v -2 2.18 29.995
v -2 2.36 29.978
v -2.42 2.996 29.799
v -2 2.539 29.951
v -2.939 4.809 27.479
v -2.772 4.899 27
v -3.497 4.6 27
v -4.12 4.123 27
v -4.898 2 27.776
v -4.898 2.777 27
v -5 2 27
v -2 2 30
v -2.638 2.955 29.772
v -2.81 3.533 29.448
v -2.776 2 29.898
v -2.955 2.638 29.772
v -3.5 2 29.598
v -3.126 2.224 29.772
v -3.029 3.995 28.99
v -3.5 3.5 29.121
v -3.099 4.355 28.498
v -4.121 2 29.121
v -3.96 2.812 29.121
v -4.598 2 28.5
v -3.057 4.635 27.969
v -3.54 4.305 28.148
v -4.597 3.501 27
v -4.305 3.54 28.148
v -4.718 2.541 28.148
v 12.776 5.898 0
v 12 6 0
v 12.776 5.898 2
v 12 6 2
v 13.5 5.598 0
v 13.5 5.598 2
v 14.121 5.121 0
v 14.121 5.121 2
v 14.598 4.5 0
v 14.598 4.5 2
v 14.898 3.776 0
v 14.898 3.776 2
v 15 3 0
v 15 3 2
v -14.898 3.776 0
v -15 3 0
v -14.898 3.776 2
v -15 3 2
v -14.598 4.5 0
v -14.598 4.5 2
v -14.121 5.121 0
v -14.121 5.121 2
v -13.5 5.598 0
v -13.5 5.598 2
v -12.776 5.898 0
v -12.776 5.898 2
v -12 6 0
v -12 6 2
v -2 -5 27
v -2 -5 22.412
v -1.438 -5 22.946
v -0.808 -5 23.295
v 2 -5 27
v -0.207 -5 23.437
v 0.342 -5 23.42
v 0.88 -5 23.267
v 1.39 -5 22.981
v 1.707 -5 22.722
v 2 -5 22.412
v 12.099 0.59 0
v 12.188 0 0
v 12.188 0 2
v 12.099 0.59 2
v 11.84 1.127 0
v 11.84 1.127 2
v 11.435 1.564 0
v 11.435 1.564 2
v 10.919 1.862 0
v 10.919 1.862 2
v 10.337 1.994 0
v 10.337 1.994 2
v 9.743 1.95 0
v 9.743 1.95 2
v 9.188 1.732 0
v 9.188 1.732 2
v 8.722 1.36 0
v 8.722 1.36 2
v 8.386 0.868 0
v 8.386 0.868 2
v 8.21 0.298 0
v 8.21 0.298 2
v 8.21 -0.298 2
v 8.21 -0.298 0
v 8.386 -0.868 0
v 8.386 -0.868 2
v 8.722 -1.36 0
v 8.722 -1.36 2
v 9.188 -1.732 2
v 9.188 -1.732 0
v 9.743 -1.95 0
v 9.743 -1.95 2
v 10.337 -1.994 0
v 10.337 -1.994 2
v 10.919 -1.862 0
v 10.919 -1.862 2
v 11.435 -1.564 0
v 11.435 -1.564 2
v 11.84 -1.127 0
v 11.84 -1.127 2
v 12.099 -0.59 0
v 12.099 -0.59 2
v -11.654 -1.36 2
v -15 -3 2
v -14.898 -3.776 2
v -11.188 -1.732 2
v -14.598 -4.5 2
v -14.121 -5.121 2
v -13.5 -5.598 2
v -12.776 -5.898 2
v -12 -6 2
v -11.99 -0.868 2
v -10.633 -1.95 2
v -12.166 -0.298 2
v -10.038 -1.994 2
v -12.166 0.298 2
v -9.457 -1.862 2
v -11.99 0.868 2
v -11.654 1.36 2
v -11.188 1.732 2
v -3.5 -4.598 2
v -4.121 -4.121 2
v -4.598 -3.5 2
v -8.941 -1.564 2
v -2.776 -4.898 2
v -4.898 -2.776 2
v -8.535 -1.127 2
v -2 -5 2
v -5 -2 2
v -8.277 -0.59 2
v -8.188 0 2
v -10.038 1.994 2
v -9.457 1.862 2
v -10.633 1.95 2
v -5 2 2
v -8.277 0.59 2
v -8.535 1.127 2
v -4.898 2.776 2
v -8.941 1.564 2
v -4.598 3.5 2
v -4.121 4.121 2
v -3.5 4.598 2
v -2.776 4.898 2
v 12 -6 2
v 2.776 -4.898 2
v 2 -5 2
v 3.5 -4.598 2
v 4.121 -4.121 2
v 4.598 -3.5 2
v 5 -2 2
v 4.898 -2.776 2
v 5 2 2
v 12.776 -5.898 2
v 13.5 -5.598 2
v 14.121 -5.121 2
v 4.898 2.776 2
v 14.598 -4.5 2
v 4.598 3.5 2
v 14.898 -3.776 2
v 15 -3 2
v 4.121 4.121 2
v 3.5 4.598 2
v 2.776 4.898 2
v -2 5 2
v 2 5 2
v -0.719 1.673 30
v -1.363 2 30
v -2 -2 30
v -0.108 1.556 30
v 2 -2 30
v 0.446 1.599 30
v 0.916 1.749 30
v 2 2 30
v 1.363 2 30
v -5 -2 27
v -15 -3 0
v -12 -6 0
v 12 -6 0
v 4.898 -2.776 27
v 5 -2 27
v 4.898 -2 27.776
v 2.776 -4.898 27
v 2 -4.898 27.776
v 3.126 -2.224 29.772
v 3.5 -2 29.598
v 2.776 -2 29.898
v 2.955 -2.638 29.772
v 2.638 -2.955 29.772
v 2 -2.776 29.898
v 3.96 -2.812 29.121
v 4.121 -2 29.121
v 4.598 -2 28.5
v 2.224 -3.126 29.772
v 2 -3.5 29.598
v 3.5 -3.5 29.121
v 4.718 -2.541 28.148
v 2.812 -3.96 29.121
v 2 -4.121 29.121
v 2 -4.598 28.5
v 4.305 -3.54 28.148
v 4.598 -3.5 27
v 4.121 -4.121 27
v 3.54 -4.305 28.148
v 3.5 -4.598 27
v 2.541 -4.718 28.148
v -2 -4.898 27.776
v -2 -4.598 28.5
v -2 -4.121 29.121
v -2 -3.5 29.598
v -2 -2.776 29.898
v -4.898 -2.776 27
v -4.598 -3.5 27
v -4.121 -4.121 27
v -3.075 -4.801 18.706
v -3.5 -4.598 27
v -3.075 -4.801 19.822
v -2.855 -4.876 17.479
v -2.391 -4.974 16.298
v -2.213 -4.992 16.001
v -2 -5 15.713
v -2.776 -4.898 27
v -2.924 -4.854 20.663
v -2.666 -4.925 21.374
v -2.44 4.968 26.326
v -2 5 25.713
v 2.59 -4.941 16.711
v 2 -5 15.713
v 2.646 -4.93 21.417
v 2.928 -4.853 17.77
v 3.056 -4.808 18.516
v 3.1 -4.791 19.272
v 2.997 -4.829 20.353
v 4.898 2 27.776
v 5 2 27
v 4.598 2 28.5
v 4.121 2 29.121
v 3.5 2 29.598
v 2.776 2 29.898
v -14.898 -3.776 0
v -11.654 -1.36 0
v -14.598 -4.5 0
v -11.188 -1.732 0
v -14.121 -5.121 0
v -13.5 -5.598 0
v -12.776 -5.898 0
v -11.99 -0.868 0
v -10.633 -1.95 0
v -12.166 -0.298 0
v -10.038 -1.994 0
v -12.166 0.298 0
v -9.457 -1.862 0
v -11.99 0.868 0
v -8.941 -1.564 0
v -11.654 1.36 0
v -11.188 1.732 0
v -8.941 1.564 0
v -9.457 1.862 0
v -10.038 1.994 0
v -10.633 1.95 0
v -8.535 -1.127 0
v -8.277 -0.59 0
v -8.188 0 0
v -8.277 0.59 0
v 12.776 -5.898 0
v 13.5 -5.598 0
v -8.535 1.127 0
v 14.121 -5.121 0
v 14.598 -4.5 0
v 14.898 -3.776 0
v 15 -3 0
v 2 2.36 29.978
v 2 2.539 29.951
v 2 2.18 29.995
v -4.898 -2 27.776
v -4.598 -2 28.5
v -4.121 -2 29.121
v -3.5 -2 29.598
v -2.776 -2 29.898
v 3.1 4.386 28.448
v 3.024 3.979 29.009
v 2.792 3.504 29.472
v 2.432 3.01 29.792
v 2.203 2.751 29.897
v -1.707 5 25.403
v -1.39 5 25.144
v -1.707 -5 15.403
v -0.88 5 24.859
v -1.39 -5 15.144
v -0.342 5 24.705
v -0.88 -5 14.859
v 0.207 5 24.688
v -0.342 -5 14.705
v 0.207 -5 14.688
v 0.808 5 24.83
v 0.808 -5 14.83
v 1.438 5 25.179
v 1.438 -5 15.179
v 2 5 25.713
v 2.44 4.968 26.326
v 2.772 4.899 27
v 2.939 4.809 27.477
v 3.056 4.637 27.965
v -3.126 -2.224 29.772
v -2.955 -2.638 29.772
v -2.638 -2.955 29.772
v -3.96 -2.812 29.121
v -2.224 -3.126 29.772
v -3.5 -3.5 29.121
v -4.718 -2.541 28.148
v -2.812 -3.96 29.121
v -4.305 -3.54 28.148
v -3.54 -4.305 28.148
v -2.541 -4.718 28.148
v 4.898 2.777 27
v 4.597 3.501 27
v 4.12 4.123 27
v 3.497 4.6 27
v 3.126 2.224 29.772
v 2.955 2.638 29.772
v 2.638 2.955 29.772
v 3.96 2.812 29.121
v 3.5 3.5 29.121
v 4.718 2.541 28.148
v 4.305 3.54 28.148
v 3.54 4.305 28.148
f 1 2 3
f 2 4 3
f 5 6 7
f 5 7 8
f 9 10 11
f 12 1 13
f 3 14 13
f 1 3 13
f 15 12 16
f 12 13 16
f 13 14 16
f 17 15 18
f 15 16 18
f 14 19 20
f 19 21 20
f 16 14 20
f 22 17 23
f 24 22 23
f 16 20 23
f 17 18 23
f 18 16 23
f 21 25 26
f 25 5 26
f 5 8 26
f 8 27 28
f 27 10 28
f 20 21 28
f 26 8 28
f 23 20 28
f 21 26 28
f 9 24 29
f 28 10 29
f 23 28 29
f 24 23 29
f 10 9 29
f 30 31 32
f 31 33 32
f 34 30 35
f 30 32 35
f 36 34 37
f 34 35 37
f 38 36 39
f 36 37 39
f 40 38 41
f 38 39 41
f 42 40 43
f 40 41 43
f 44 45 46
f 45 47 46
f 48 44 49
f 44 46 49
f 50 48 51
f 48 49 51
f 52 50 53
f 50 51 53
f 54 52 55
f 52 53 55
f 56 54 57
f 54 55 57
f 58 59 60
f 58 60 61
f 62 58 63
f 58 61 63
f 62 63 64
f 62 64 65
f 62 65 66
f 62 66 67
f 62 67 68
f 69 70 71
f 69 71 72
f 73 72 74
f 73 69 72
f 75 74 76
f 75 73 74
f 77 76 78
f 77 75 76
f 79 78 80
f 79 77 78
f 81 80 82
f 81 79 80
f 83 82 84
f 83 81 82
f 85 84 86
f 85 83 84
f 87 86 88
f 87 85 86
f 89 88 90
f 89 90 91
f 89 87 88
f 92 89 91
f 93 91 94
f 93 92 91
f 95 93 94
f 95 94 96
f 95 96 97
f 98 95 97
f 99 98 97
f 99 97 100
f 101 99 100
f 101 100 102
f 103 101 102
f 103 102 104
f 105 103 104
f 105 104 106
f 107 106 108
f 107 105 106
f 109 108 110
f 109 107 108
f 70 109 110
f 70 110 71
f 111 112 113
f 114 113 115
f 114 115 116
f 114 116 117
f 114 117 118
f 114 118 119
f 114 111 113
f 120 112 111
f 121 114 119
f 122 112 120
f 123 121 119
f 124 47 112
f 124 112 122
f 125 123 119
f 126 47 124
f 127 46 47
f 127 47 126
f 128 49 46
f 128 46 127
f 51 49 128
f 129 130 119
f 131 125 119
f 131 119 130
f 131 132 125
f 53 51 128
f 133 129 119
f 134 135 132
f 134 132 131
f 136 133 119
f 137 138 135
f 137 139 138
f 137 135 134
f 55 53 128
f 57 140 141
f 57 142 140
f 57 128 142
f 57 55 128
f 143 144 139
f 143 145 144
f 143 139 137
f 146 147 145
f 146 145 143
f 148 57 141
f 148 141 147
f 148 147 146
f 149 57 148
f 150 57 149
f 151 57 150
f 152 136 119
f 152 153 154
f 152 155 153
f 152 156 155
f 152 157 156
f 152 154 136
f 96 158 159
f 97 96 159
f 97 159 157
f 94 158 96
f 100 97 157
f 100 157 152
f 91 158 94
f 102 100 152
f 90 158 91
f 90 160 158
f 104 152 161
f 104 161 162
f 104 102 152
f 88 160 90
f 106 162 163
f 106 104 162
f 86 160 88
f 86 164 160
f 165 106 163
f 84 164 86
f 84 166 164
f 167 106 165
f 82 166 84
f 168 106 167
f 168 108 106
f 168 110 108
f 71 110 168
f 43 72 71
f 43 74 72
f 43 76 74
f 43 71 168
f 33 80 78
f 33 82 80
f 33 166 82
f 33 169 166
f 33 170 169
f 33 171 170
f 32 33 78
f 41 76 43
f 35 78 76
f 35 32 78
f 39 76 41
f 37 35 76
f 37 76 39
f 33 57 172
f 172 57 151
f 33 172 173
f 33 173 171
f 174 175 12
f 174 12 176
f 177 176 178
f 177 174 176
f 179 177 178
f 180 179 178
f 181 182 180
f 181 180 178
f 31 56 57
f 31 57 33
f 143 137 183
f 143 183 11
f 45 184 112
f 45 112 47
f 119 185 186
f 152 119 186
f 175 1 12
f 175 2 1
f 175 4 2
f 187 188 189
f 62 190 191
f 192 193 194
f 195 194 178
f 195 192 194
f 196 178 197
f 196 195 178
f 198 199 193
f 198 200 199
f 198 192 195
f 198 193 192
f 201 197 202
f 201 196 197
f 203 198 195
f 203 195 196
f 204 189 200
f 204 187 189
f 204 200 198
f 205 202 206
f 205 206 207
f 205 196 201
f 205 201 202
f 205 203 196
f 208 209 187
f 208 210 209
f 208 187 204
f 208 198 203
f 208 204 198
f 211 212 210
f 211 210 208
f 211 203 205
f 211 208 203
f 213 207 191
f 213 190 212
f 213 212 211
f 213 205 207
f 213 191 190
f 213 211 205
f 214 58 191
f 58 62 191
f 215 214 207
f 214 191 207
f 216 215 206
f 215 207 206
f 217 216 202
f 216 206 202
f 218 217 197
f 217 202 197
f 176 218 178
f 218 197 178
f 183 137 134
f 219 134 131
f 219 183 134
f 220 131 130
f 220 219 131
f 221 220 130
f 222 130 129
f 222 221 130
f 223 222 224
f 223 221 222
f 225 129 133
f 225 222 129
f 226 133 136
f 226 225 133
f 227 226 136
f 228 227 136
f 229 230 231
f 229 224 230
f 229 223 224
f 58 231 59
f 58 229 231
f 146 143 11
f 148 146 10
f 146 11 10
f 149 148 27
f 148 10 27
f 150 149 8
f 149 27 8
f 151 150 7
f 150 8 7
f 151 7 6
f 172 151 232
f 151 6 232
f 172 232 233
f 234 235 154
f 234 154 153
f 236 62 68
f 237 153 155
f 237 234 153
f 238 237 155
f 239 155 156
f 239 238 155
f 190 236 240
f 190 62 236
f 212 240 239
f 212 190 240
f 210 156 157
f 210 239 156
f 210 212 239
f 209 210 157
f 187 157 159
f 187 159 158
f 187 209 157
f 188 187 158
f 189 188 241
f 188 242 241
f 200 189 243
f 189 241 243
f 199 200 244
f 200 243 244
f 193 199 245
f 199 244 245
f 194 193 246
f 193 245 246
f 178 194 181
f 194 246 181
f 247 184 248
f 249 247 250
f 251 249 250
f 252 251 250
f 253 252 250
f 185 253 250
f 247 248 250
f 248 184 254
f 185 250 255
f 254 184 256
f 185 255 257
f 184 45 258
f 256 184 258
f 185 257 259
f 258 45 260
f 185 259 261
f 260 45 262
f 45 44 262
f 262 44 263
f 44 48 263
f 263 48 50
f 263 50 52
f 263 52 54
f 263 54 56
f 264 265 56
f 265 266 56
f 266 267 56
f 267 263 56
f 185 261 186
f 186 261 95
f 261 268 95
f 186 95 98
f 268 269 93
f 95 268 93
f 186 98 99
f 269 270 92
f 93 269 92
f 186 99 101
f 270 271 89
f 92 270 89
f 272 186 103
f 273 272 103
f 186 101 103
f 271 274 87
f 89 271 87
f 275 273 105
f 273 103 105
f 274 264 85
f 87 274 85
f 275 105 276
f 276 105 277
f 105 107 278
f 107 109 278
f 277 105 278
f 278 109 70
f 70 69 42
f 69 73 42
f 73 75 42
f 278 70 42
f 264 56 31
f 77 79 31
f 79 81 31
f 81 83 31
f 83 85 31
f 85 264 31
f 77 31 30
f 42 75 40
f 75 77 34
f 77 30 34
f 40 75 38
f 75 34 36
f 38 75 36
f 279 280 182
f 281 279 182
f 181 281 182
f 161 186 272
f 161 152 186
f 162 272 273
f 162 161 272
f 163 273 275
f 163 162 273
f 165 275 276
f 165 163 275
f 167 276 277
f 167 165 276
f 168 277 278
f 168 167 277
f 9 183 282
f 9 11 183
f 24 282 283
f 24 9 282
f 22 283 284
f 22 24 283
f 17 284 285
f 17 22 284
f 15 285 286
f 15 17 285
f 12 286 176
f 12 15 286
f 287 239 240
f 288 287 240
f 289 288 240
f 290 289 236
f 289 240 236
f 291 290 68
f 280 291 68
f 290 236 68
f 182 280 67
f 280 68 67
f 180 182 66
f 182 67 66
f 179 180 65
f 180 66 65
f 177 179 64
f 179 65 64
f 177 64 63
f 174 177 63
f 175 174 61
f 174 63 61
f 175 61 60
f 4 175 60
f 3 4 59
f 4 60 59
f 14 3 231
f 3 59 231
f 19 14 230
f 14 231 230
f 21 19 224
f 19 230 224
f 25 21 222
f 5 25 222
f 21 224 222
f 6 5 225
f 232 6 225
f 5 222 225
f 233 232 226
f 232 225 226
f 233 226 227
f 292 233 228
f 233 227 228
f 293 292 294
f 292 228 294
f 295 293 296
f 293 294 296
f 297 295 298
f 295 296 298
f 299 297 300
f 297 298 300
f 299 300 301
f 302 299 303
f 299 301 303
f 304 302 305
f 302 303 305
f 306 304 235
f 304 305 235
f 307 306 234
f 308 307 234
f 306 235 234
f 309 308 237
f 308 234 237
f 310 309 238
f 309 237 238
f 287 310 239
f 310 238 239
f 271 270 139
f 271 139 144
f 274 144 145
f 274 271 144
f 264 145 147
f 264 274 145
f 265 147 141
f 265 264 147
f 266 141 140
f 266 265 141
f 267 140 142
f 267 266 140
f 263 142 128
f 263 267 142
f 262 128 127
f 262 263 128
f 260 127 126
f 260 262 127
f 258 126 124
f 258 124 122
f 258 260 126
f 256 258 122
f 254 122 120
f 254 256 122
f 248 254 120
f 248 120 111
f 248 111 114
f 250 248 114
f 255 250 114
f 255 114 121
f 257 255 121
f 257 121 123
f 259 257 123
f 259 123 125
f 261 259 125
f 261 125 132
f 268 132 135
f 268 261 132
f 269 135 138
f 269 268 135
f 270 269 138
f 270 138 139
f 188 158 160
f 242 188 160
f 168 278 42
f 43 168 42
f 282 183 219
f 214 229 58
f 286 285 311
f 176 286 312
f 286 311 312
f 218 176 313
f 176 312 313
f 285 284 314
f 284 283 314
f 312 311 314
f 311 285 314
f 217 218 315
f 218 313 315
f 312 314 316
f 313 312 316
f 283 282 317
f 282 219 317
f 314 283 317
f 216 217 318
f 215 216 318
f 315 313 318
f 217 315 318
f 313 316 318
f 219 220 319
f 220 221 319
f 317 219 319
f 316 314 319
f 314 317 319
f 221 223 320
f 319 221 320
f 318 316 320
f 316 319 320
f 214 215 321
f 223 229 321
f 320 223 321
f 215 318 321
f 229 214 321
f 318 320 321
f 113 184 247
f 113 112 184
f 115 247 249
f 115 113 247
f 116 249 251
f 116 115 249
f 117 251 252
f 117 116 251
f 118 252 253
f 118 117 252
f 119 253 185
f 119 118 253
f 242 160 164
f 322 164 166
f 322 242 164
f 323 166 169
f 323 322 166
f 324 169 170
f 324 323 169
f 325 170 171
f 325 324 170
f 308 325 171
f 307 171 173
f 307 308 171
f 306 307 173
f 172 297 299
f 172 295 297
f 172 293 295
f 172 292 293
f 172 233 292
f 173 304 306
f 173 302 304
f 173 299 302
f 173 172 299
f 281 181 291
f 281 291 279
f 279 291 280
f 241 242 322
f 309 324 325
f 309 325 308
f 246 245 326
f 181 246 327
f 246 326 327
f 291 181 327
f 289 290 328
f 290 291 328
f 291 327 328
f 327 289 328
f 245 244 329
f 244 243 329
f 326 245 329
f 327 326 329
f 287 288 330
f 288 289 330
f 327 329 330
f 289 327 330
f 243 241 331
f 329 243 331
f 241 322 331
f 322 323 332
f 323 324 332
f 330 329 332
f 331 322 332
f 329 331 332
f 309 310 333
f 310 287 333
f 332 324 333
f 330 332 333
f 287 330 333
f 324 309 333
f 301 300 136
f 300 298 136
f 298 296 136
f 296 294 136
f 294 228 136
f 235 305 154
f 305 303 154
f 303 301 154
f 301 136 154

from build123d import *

# Parameters (mm, degrees)
F0_W     = 30
F0_H     = 12
F0_R     = 2
F0_W_2   = 10
F0_H_2   = 10
F1_DEPTH = 2
F2_DEPTH = 30
F3_R     = 3
F5_R     = 3.1
F6_DEPTH = 100


with BuildPart() as f1:
    # F0 (on Top) → F1 (new body)
    with BuildSketch(Plane.XY):
        Rectangle(F0_W, F0_H)
        with Locations((-10.187883, 0)):
            Circle(F0_R, mode=Mode.SUBTRACT)
        Rectangle(F0_W_2, F0_H_2, mode=Mode.SUBTRACT)
        with Locations((10.187883, 0)):
            Circle(F0_R, mode=Mode.SUBTRACT)
        Rectangle(F0_W_2, F0_H_2)
    extrude(amount=F1_DEPTH)

    # F0 (on Top) → F2 (join)
    with BuildSketch(Plane.XY):
        Rectangle(F0_W_2, F0_H_2)
    extrude(amount=F2_DEPTH)

    # F3
    f3_edges = [f1.edges().sort_by_distance(p)[0] for p in [
        (-15, -6, 1),
        (-5, -5, 16),
        (5, -5, 16),
        (5, 5, 16),
        (15, -6, 1),
        (15, 6, 1),
        (-5, 5, 16),
        (-15, 6, 1),
        (5, 0, 30),
        (0, 5, 30),
        (-5, 0, 30),
        (0, -5, 30),
    ]]
    fillet(f3_edges, radius=F3_R)

    # F5 (on face) → F6 (cut)
    with BuildSketch(Plane(origin=(0, -3, -3), x_dir=(1, 0, 0), z_dir=(0, -0.707107, -0.707107))):
        with Locations((0, 17.014893)):
            Circle(F5_R)
    extrude(amount=-F6_DEPTH, mode=Mode.SUBTRACT)


solid = f1.part
